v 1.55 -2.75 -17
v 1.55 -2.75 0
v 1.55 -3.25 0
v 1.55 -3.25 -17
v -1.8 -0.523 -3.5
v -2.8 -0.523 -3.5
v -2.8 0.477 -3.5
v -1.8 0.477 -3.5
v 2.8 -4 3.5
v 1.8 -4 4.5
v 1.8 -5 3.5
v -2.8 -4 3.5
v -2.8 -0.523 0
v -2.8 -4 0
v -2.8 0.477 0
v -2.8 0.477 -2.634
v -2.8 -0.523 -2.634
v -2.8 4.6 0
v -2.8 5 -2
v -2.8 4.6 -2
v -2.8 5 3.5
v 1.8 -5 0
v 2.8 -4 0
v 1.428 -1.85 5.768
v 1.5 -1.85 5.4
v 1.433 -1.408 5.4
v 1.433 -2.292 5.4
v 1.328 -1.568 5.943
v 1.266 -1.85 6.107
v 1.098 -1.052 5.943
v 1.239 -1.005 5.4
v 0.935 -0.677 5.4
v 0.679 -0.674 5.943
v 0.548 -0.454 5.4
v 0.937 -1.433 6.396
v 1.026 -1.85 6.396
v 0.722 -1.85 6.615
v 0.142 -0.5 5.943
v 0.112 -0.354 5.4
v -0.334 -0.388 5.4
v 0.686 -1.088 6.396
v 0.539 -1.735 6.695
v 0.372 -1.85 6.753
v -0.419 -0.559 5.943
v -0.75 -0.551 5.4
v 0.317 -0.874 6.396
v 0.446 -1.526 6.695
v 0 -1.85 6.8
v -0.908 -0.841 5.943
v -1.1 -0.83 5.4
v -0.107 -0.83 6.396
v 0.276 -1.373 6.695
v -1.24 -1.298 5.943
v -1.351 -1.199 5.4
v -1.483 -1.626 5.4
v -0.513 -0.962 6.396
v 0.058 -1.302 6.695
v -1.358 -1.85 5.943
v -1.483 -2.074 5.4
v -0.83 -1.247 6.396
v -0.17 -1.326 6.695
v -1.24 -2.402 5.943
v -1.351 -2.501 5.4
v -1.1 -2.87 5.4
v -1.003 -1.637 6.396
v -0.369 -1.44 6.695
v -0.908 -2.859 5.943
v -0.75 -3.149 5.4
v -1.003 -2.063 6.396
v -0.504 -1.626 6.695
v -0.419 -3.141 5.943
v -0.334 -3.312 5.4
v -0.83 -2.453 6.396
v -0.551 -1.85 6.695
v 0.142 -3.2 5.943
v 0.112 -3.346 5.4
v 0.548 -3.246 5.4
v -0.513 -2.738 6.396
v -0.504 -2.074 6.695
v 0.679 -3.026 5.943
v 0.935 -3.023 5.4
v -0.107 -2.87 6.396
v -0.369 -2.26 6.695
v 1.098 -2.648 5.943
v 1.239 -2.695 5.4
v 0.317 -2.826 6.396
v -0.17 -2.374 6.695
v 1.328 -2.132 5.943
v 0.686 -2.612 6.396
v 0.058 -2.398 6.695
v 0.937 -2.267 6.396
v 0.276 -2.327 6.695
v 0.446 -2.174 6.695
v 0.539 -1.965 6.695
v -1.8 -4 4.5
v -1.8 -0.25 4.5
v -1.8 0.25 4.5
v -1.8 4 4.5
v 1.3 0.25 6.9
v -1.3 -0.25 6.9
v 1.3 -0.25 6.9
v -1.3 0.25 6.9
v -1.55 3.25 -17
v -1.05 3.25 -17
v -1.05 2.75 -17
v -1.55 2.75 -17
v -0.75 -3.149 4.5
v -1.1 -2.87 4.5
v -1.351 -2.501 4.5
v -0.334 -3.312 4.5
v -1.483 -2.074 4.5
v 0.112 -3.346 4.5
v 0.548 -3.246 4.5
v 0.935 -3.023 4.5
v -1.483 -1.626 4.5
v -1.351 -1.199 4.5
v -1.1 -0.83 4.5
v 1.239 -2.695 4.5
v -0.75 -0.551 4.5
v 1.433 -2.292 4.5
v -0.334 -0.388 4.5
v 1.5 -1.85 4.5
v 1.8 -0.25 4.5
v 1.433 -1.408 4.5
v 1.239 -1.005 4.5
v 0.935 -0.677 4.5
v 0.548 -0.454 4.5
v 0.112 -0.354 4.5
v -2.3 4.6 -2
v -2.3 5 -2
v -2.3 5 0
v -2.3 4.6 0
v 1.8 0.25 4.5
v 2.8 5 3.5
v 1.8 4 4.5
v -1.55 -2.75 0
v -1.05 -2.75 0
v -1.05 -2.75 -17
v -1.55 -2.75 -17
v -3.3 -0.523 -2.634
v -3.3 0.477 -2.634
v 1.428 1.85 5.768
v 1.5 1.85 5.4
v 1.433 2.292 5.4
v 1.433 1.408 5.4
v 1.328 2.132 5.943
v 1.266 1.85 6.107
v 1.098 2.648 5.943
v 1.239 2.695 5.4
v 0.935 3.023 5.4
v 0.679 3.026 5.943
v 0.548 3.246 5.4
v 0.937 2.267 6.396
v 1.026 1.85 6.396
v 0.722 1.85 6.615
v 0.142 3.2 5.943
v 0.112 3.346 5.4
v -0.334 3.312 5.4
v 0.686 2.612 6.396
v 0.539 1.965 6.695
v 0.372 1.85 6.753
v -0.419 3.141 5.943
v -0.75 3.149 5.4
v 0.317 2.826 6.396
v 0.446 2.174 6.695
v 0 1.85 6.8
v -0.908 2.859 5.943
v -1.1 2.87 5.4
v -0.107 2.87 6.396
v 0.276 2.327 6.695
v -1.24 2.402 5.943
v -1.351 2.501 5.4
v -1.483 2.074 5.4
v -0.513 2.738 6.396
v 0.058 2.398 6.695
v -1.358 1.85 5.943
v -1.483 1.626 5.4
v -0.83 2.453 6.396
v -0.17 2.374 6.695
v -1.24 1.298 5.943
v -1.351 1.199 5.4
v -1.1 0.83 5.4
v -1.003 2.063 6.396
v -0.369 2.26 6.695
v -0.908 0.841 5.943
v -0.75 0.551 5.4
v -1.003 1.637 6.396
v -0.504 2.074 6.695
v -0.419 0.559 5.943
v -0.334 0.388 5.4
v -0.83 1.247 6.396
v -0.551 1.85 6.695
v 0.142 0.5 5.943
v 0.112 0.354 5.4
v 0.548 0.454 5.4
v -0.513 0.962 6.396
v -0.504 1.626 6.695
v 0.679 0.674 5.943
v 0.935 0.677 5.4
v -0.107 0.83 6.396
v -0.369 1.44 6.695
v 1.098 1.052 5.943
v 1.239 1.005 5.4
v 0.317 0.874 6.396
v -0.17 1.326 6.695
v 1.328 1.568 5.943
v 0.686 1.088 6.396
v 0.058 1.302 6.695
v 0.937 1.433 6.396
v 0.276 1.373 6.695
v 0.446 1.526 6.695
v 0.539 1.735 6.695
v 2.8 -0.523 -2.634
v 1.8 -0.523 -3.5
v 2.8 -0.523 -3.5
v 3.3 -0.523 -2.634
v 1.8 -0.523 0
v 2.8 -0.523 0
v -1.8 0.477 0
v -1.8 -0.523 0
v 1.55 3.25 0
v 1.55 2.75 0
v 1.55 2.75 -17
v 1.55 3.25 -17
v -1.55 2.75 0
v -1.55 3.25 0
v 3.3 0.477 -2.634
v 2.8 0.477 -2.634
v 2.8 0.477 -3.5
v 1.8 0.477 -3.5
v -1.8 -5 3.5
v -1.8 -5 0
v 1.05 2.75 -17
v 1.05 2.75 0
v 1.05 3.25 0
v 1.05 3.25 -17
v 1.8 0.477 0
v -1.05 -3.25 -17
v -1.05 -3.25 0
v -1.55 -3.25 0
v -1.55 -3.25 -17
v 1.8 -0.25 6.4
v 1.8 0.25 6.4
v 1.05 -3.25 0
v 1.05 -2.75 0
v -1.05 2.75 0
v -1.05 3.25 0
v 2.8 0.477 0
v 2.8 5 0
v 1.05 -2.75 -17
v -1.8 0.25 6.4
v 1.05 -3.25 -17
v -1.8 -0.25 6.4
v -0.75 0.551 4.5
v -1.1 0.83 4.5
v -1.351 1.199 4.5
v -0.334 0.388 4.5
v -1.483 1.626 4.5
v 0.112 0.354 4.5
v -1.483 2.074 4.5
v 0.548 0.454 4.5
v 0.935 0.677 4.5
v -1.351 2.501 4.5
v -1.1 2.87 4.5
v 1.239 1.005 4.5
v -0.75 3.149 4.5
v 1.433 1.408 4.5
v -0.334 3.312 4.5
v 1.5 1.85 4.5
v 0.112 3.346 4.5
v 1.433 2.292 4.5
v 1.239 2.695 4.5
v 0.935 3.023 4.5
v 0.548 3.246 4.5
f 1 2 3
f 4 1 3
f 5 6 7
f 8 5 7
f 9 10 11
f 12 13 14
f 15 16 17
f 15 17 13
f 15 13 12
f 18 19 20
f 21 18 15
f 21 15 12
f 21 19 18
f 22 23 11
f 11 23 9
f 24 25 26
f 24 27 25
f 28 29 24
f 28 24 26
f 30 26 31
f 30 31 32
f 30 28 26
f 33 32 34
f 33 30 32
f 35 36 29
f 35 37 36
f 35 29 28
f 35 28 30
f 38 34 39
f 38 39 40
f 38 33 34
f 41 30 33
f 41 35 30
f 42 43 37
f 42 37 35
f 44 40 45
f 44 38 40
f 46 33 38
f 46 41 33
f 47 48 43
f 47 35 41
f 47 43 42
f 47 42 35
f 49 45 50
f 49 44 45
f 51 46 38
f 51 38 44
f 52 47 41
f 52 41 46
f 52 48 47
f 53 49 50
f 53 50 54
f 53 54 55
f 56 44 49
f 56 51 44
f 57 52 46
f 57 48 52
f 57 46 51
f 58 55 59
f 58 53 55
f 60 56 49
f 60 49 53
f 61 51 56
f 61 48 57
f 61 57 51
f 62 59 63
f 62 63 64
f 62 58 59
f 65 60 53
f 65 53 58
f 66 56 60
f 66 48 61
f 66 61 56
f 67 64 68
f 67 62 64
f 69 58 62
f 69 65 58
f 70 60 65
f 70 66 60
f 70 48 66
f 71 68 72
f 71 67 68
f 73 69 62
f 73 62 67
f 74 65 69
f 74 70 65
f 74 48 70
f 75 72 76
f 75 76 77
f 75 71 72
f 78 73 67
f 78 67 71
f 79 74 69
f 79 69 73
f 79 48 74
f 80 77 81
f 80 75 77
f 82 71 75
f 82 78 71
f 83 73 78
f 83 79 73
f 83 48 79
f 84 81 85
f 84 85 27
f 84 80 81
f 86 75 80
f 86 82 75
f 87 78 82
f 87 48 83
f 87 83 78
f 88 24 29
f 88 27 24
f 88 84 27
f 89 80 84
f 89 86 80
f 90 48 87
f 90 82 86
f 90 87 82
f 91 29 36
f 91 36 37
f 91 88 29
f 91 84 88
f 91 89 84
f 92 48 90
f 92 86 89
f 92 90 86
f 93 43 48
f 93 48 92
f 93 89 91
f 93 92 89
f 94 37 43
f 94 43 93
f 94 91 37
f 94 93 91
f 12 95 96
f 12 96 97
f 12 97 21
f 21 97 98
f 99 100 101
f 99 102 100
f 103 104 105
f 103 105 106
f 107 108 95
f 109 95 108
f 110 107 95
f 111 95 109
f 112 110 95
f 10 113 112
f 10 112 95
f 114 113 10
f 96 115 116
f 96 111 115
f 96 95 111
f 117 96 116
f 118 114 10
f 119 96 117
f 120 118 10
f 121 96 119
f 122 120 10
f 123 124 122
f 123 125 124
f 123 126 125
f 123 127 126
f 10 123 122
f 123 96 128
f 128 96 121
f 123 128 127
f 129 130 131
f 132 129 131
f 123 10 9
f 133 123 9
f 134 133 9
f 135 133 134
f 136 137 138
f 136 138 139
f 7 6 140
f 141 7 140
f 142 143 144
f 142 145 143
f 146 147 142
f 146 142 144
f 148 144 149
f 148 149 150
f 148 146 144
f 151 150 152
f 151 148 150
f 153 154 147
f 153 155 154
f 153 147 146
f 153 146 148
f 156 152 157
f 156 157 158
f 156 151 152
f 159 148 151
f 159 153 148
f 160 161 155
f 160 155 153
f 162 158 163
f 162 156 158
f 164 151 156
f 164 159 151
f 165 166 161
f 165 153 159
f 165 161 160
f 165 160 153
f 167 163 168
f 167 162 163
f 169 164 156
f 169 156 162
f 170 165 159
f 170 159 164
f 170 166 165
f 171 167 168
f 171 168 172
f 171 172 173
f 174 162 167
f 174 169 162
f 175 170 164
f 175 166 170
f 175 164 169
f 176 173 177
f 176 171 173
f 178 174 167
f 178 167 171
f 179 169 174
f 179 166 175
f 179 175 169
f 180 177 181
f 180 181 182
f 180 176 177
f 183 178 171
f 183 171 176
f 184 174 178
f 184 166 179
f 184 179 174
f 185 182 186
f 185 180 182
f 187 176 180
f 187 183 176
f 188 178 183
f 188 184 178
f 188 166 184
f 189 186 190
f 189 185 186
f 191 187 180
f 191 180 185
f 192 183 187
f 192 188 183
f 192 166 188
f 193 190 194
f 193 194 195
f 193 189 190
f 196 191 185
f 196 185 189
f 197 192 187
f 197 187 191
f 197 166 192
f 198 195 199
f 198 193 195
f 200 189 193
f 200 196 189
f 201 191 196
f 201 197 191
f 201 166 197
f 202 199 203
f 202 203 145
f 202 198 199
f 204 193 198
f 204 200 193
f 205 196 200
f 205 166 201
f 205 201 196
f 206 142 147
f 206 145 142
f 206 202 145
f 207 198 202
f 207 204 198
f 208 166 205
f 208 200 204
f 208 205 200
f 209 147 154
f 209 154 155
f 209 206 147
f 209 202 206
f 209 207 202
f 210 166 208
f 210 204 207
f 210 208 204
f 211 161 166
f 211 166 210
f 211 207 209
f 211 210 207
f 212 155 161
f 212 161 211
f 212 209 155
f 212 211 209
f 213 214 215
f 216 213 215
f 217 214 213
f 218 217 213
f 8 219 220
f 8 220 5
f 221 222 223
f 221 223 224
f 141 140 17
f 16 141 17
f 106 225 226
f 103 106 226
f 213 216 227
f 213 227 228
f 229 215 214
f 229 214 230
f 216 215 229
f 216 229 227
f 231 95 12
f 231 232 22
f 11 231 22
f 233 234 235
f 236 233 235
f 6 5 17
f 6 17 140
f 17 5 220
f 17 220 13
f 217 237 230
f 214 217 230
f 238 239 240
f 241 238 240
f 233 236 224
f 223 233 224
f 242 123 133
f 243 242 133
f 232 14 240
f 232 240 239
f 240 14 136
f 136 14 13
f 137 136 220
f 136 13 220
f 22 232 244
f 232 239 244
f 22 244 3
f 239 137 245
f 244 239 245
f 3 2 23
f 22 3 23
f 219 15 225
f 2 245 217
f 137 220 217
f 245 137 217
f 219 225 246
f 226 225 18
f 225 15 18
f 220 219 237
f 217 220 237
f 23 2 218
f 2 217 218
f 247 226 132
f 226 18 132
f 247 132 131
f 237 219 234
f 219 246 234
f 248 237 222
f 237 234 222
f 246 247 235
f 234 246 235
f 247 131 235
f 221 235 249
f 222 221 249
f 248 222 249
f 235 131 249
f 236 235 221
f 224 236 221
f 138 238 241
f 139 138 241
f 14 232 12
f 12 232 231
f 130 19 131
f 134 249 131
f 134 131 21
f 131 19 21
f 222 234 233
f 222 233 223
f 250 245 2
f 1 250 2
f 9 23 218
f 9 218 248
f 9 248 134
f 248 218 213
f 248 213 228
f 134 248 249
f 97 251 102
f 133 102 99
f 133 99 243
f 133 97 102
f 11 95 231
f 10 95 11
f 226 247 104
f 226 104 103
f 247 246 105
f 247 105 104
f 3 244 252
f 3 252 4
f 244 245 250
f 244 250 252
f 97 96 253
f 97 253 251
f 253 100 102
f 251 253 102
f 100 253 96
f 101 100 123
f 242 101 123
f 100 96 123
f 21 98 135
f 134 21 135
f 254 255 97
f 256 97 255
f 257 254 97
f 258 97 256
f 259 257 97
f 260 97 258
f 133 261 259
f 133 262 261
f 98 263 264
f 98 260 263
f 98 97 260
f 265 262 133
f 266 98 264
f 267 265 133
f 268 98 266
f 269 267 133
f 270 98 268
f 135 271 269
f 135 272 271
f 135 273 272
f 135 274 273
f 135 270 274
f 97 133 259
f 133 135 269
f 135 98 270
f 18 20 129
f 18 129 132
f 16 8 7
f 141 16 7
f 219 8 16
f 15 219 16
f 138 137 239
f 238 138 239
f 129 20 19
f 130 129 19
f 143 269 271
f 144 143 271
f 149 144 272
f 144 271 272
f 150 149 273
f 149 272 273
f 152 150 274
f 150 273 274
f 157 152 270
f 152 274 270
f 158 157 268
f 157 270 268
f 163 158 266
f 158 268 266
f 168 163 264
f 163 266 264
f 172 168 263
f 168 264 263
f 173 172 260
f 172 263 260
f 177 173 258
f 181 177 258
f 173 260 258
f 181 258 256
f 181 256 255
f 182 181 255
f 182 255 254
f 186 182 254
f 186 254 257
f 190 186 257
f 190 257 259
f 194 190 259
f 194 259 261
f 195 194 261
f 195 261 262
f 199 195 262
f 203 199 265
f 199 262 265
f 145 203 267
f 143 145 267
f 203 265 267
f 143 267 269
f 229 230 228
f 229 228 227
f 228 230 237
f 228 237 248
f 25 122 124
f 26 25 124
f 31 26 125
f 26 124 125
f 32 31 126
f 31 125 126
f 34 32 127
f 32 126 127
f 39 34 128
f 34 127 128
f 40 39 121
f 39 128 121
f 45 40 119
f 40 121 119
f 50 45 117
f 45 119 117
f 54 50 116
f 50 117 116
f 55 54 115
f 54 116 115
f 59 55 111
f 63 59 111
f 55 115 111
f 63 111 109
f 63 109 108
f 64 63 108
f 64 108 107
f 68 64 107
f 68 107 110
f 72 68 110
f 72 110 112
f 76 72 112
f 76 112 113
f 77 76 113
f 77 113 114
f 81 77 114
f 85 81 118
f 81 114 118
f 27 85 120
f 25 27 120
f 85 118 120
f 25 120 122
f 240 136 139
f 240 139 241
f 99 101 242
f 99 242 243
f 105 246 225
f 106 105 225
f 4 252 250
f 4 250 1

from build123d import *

# Parameters (mm, degrees)
SKETCH1_W               = 5.6
SKETCH1_H               = 10
BOSS_EXTRUDE1_DEPTH     = 4.5
CHAMFER1_SIZE           = 1
SKETCH2_R               = 1.5
BOSS_EXTRUDE2_DEPTH     = 0.9
SKETCH3_W               = 3.6
SKETCH3_H               = 0.5
BOSS_EXTRUDE3_DEPTH     = 2.4
CHAMFER2_SIZE           = 0.5
SKETCH4_W               = 3.5
SKETCH4_H               = 1
BOSS_EXTRUDE4_DEPTH     = 1
BOSS_EXTRUDE5_DEPTH     = 1
SKETCH6_W               = 2
SKETCH6_H               = 0.4
BOSS_EXTRUDE6_DEPTH     = 0.5
SKETCH7_W               = 0.5
SKETCH7_H               = 0.5
BOSS_EXTRUDE7_DEPTH     = 17
MIRROR3_COPY_1_SKETCH_W = 0.5
MIRROR3_COPY_1_SKETCH_H = 0.5
MIRROR3_COPY_1_DEPTH    = 17


# Read off the part's stored shape, not the designer's step: Dome1, Dome2
with BuildPart() as part:
    # Sketch1 → Boss-Extrude1 (new body)
    with BuildSketch(Plane.XY):
        Rectangle(SKETCH1_W, SKETCH1_H)
    extrude(amount=BOSS_EXTRUDE1_DEPTH)

    # Chamfer1
    chamfer1_edges = [part.edges().sort_by_distance(p)[0] for p in [
        (-2.8, 0, 4.5),
        (0, -5, 4.5),
        (2.8, 0, 4.5),
        (0, 5, 4.5),
        (2.8, -5, 2.25),
        (-2.8, -5, 2.25),
    ]]
    chamfer(chamfer1_edges, length=CHAMFER1_SIZE)

    # Sketch2 → Boss-Extrude2 (add)
    with BuildSketch(Plane.XY.offset(4.5)):
        with Locations((0, 1.85)):
            Circle(SKETCH2_R)
        with Locations((0, -1.85)):
            Circle(SKETCH2_R)
    extrude(amount=BOSS_EXTRUDE2_DEPTH)

    # Dome1 outline → Dome1 (revolve)
    with BuildSketch(Plane.XZ.offset(-1.85)):
        with BuildLine():
            Line((0, 5.4), (1.5, 5.399999999))
            ThreePointArc((1.5, 5.399999999), (1.025914227, 6.395622385), (0, 6.8))
            Line((0, 6.8), (0, 5.4))
        make_face()
    revolve(axis=Axis((0, 1.85, 0), (0, 0, 1)))

    # Dome2 outline → Dome2 (revolve)
    with BuildSketch(Plane.XZ.offset(1.85)):
        with BuildLine():
            Line((0, 5.4), (1.5, 5.399999999))
            ThreePointArc((1.5, 5.399999999), (1.025914227, 6.395622385), (0, 6.8))
            Line((0, 6.8), (0, 5.4))
        make_face()
    revolve(axis=Axis((0, -1.85, 0), (0, 0, 1)))

    # Sketch3 → Boss-Extrude3 (add)
    with BuildSketch(Plane.XY.offset(4.5)):
        Rectangle(SKETCH3_W, SKETCH3_H)
    extrude(amount=BOSS_EXTRUDE3_DEPTH)

    # Chamfer2
    chamfer2_edges = [part.edges().sort_by_distance(p)[0] for p in [
        (1.8, 0, 6.9),
        (-1.8, 0, 6.9),
    ]]
    chamfer(chamfer2_edges, length=CHAMFER2_SIZE)

    # Sketch4 → Boss-Extrude4 (add)
    with BuildSketch(Plane(origin=(2.8, 0, 0), x_dir=(0, 0, -1), z_dir=(1, 0, 0))):
        with Locations((1.75, -0.023003027)):
            Rectangle(SKETCH4_W, SKETCH4_H)
    boss_extrude4 = extrude(amount=-BOSS_EXTRUDE4_DEPTH)

    # Sketch5 → Boss-Extrude5 (add)
    with BuildSketch(Plane.XZ.offset(0.523003027)):
        Polygon((2.8, -2.633974596), (2.8, -3.5), (3.3, -2.633974596), align=None)
    boss_extrude5 = extrude(amount=-BOSS_EXTRUDE5_DEPTH)

    # Mirror1: Boss-Extrude4, Boss-Extrude5 across plane
    add(boss_extrude4.mirror(Plane(origin=(0, 0, 0), x_dir=(0, 0, 1), z_dir=(1, 0, 0))))
    add(boss_extrude5.mirror(Plane(origin=(0, 0, 0), x_dir=(0, 0, 1), z_dir=(1, 0, 0))))

    # Sketch6 → Boss-Extrude6 (add)
    with BuildSketch(Plane.ZY.offset(2.8)):
        with Locations((-1, 4.8)):
            Rectangle(SKETCH6_W, SKETCH6_H)
    extrude(amount=-BOSS_EXTRUDE6_DEPTH)

    # Sketch7 → Boss-Extrude7 (add)
    with BuildSketch(Plane(origin=(0, 0, 0), x_dir=(-1, 0, 0), z_dir=(0, 0, -1))):
        with Locations((1.3, 3)):
            Rectangle(SKETCH7_W, SKETCH7_H)
    boss_extrude7 = extrude(amount=BOSS_EXTRUDE7_DEPTH)

    # Mirror2: Boss-Extrude7 across plane
    add(boss_extrude7.mirror(Plane(origin=(0, 0, 0), x_dir=(0, 0, 1), z_dir=(1, 0, 0))))

    # Mirror3: Boss-Extrude7 across plane
    add(boss_extrude7.mirror(Plane(origin=(0, 0, 0), x_dir=(0, 0, 1), z_dir=(0, -1, 0))))

    # Mirror3 copy 1 sketch → Mirror3 copy 1 (add)
    with BuildSketch(Plane(origin=(0, 0, 0), x_dir=(1, 0, 0), z_dir=(0, 0, -1))):
        with Locations((1.3, 3)):
            Rectangle(MIRROR3_COPY_1_SKETCH_W, MIRROR3_COPY_1_SKETCH_H)
    extrude(amount=MIRROR3_COPY_1_DEPTH)


solid = part.part
